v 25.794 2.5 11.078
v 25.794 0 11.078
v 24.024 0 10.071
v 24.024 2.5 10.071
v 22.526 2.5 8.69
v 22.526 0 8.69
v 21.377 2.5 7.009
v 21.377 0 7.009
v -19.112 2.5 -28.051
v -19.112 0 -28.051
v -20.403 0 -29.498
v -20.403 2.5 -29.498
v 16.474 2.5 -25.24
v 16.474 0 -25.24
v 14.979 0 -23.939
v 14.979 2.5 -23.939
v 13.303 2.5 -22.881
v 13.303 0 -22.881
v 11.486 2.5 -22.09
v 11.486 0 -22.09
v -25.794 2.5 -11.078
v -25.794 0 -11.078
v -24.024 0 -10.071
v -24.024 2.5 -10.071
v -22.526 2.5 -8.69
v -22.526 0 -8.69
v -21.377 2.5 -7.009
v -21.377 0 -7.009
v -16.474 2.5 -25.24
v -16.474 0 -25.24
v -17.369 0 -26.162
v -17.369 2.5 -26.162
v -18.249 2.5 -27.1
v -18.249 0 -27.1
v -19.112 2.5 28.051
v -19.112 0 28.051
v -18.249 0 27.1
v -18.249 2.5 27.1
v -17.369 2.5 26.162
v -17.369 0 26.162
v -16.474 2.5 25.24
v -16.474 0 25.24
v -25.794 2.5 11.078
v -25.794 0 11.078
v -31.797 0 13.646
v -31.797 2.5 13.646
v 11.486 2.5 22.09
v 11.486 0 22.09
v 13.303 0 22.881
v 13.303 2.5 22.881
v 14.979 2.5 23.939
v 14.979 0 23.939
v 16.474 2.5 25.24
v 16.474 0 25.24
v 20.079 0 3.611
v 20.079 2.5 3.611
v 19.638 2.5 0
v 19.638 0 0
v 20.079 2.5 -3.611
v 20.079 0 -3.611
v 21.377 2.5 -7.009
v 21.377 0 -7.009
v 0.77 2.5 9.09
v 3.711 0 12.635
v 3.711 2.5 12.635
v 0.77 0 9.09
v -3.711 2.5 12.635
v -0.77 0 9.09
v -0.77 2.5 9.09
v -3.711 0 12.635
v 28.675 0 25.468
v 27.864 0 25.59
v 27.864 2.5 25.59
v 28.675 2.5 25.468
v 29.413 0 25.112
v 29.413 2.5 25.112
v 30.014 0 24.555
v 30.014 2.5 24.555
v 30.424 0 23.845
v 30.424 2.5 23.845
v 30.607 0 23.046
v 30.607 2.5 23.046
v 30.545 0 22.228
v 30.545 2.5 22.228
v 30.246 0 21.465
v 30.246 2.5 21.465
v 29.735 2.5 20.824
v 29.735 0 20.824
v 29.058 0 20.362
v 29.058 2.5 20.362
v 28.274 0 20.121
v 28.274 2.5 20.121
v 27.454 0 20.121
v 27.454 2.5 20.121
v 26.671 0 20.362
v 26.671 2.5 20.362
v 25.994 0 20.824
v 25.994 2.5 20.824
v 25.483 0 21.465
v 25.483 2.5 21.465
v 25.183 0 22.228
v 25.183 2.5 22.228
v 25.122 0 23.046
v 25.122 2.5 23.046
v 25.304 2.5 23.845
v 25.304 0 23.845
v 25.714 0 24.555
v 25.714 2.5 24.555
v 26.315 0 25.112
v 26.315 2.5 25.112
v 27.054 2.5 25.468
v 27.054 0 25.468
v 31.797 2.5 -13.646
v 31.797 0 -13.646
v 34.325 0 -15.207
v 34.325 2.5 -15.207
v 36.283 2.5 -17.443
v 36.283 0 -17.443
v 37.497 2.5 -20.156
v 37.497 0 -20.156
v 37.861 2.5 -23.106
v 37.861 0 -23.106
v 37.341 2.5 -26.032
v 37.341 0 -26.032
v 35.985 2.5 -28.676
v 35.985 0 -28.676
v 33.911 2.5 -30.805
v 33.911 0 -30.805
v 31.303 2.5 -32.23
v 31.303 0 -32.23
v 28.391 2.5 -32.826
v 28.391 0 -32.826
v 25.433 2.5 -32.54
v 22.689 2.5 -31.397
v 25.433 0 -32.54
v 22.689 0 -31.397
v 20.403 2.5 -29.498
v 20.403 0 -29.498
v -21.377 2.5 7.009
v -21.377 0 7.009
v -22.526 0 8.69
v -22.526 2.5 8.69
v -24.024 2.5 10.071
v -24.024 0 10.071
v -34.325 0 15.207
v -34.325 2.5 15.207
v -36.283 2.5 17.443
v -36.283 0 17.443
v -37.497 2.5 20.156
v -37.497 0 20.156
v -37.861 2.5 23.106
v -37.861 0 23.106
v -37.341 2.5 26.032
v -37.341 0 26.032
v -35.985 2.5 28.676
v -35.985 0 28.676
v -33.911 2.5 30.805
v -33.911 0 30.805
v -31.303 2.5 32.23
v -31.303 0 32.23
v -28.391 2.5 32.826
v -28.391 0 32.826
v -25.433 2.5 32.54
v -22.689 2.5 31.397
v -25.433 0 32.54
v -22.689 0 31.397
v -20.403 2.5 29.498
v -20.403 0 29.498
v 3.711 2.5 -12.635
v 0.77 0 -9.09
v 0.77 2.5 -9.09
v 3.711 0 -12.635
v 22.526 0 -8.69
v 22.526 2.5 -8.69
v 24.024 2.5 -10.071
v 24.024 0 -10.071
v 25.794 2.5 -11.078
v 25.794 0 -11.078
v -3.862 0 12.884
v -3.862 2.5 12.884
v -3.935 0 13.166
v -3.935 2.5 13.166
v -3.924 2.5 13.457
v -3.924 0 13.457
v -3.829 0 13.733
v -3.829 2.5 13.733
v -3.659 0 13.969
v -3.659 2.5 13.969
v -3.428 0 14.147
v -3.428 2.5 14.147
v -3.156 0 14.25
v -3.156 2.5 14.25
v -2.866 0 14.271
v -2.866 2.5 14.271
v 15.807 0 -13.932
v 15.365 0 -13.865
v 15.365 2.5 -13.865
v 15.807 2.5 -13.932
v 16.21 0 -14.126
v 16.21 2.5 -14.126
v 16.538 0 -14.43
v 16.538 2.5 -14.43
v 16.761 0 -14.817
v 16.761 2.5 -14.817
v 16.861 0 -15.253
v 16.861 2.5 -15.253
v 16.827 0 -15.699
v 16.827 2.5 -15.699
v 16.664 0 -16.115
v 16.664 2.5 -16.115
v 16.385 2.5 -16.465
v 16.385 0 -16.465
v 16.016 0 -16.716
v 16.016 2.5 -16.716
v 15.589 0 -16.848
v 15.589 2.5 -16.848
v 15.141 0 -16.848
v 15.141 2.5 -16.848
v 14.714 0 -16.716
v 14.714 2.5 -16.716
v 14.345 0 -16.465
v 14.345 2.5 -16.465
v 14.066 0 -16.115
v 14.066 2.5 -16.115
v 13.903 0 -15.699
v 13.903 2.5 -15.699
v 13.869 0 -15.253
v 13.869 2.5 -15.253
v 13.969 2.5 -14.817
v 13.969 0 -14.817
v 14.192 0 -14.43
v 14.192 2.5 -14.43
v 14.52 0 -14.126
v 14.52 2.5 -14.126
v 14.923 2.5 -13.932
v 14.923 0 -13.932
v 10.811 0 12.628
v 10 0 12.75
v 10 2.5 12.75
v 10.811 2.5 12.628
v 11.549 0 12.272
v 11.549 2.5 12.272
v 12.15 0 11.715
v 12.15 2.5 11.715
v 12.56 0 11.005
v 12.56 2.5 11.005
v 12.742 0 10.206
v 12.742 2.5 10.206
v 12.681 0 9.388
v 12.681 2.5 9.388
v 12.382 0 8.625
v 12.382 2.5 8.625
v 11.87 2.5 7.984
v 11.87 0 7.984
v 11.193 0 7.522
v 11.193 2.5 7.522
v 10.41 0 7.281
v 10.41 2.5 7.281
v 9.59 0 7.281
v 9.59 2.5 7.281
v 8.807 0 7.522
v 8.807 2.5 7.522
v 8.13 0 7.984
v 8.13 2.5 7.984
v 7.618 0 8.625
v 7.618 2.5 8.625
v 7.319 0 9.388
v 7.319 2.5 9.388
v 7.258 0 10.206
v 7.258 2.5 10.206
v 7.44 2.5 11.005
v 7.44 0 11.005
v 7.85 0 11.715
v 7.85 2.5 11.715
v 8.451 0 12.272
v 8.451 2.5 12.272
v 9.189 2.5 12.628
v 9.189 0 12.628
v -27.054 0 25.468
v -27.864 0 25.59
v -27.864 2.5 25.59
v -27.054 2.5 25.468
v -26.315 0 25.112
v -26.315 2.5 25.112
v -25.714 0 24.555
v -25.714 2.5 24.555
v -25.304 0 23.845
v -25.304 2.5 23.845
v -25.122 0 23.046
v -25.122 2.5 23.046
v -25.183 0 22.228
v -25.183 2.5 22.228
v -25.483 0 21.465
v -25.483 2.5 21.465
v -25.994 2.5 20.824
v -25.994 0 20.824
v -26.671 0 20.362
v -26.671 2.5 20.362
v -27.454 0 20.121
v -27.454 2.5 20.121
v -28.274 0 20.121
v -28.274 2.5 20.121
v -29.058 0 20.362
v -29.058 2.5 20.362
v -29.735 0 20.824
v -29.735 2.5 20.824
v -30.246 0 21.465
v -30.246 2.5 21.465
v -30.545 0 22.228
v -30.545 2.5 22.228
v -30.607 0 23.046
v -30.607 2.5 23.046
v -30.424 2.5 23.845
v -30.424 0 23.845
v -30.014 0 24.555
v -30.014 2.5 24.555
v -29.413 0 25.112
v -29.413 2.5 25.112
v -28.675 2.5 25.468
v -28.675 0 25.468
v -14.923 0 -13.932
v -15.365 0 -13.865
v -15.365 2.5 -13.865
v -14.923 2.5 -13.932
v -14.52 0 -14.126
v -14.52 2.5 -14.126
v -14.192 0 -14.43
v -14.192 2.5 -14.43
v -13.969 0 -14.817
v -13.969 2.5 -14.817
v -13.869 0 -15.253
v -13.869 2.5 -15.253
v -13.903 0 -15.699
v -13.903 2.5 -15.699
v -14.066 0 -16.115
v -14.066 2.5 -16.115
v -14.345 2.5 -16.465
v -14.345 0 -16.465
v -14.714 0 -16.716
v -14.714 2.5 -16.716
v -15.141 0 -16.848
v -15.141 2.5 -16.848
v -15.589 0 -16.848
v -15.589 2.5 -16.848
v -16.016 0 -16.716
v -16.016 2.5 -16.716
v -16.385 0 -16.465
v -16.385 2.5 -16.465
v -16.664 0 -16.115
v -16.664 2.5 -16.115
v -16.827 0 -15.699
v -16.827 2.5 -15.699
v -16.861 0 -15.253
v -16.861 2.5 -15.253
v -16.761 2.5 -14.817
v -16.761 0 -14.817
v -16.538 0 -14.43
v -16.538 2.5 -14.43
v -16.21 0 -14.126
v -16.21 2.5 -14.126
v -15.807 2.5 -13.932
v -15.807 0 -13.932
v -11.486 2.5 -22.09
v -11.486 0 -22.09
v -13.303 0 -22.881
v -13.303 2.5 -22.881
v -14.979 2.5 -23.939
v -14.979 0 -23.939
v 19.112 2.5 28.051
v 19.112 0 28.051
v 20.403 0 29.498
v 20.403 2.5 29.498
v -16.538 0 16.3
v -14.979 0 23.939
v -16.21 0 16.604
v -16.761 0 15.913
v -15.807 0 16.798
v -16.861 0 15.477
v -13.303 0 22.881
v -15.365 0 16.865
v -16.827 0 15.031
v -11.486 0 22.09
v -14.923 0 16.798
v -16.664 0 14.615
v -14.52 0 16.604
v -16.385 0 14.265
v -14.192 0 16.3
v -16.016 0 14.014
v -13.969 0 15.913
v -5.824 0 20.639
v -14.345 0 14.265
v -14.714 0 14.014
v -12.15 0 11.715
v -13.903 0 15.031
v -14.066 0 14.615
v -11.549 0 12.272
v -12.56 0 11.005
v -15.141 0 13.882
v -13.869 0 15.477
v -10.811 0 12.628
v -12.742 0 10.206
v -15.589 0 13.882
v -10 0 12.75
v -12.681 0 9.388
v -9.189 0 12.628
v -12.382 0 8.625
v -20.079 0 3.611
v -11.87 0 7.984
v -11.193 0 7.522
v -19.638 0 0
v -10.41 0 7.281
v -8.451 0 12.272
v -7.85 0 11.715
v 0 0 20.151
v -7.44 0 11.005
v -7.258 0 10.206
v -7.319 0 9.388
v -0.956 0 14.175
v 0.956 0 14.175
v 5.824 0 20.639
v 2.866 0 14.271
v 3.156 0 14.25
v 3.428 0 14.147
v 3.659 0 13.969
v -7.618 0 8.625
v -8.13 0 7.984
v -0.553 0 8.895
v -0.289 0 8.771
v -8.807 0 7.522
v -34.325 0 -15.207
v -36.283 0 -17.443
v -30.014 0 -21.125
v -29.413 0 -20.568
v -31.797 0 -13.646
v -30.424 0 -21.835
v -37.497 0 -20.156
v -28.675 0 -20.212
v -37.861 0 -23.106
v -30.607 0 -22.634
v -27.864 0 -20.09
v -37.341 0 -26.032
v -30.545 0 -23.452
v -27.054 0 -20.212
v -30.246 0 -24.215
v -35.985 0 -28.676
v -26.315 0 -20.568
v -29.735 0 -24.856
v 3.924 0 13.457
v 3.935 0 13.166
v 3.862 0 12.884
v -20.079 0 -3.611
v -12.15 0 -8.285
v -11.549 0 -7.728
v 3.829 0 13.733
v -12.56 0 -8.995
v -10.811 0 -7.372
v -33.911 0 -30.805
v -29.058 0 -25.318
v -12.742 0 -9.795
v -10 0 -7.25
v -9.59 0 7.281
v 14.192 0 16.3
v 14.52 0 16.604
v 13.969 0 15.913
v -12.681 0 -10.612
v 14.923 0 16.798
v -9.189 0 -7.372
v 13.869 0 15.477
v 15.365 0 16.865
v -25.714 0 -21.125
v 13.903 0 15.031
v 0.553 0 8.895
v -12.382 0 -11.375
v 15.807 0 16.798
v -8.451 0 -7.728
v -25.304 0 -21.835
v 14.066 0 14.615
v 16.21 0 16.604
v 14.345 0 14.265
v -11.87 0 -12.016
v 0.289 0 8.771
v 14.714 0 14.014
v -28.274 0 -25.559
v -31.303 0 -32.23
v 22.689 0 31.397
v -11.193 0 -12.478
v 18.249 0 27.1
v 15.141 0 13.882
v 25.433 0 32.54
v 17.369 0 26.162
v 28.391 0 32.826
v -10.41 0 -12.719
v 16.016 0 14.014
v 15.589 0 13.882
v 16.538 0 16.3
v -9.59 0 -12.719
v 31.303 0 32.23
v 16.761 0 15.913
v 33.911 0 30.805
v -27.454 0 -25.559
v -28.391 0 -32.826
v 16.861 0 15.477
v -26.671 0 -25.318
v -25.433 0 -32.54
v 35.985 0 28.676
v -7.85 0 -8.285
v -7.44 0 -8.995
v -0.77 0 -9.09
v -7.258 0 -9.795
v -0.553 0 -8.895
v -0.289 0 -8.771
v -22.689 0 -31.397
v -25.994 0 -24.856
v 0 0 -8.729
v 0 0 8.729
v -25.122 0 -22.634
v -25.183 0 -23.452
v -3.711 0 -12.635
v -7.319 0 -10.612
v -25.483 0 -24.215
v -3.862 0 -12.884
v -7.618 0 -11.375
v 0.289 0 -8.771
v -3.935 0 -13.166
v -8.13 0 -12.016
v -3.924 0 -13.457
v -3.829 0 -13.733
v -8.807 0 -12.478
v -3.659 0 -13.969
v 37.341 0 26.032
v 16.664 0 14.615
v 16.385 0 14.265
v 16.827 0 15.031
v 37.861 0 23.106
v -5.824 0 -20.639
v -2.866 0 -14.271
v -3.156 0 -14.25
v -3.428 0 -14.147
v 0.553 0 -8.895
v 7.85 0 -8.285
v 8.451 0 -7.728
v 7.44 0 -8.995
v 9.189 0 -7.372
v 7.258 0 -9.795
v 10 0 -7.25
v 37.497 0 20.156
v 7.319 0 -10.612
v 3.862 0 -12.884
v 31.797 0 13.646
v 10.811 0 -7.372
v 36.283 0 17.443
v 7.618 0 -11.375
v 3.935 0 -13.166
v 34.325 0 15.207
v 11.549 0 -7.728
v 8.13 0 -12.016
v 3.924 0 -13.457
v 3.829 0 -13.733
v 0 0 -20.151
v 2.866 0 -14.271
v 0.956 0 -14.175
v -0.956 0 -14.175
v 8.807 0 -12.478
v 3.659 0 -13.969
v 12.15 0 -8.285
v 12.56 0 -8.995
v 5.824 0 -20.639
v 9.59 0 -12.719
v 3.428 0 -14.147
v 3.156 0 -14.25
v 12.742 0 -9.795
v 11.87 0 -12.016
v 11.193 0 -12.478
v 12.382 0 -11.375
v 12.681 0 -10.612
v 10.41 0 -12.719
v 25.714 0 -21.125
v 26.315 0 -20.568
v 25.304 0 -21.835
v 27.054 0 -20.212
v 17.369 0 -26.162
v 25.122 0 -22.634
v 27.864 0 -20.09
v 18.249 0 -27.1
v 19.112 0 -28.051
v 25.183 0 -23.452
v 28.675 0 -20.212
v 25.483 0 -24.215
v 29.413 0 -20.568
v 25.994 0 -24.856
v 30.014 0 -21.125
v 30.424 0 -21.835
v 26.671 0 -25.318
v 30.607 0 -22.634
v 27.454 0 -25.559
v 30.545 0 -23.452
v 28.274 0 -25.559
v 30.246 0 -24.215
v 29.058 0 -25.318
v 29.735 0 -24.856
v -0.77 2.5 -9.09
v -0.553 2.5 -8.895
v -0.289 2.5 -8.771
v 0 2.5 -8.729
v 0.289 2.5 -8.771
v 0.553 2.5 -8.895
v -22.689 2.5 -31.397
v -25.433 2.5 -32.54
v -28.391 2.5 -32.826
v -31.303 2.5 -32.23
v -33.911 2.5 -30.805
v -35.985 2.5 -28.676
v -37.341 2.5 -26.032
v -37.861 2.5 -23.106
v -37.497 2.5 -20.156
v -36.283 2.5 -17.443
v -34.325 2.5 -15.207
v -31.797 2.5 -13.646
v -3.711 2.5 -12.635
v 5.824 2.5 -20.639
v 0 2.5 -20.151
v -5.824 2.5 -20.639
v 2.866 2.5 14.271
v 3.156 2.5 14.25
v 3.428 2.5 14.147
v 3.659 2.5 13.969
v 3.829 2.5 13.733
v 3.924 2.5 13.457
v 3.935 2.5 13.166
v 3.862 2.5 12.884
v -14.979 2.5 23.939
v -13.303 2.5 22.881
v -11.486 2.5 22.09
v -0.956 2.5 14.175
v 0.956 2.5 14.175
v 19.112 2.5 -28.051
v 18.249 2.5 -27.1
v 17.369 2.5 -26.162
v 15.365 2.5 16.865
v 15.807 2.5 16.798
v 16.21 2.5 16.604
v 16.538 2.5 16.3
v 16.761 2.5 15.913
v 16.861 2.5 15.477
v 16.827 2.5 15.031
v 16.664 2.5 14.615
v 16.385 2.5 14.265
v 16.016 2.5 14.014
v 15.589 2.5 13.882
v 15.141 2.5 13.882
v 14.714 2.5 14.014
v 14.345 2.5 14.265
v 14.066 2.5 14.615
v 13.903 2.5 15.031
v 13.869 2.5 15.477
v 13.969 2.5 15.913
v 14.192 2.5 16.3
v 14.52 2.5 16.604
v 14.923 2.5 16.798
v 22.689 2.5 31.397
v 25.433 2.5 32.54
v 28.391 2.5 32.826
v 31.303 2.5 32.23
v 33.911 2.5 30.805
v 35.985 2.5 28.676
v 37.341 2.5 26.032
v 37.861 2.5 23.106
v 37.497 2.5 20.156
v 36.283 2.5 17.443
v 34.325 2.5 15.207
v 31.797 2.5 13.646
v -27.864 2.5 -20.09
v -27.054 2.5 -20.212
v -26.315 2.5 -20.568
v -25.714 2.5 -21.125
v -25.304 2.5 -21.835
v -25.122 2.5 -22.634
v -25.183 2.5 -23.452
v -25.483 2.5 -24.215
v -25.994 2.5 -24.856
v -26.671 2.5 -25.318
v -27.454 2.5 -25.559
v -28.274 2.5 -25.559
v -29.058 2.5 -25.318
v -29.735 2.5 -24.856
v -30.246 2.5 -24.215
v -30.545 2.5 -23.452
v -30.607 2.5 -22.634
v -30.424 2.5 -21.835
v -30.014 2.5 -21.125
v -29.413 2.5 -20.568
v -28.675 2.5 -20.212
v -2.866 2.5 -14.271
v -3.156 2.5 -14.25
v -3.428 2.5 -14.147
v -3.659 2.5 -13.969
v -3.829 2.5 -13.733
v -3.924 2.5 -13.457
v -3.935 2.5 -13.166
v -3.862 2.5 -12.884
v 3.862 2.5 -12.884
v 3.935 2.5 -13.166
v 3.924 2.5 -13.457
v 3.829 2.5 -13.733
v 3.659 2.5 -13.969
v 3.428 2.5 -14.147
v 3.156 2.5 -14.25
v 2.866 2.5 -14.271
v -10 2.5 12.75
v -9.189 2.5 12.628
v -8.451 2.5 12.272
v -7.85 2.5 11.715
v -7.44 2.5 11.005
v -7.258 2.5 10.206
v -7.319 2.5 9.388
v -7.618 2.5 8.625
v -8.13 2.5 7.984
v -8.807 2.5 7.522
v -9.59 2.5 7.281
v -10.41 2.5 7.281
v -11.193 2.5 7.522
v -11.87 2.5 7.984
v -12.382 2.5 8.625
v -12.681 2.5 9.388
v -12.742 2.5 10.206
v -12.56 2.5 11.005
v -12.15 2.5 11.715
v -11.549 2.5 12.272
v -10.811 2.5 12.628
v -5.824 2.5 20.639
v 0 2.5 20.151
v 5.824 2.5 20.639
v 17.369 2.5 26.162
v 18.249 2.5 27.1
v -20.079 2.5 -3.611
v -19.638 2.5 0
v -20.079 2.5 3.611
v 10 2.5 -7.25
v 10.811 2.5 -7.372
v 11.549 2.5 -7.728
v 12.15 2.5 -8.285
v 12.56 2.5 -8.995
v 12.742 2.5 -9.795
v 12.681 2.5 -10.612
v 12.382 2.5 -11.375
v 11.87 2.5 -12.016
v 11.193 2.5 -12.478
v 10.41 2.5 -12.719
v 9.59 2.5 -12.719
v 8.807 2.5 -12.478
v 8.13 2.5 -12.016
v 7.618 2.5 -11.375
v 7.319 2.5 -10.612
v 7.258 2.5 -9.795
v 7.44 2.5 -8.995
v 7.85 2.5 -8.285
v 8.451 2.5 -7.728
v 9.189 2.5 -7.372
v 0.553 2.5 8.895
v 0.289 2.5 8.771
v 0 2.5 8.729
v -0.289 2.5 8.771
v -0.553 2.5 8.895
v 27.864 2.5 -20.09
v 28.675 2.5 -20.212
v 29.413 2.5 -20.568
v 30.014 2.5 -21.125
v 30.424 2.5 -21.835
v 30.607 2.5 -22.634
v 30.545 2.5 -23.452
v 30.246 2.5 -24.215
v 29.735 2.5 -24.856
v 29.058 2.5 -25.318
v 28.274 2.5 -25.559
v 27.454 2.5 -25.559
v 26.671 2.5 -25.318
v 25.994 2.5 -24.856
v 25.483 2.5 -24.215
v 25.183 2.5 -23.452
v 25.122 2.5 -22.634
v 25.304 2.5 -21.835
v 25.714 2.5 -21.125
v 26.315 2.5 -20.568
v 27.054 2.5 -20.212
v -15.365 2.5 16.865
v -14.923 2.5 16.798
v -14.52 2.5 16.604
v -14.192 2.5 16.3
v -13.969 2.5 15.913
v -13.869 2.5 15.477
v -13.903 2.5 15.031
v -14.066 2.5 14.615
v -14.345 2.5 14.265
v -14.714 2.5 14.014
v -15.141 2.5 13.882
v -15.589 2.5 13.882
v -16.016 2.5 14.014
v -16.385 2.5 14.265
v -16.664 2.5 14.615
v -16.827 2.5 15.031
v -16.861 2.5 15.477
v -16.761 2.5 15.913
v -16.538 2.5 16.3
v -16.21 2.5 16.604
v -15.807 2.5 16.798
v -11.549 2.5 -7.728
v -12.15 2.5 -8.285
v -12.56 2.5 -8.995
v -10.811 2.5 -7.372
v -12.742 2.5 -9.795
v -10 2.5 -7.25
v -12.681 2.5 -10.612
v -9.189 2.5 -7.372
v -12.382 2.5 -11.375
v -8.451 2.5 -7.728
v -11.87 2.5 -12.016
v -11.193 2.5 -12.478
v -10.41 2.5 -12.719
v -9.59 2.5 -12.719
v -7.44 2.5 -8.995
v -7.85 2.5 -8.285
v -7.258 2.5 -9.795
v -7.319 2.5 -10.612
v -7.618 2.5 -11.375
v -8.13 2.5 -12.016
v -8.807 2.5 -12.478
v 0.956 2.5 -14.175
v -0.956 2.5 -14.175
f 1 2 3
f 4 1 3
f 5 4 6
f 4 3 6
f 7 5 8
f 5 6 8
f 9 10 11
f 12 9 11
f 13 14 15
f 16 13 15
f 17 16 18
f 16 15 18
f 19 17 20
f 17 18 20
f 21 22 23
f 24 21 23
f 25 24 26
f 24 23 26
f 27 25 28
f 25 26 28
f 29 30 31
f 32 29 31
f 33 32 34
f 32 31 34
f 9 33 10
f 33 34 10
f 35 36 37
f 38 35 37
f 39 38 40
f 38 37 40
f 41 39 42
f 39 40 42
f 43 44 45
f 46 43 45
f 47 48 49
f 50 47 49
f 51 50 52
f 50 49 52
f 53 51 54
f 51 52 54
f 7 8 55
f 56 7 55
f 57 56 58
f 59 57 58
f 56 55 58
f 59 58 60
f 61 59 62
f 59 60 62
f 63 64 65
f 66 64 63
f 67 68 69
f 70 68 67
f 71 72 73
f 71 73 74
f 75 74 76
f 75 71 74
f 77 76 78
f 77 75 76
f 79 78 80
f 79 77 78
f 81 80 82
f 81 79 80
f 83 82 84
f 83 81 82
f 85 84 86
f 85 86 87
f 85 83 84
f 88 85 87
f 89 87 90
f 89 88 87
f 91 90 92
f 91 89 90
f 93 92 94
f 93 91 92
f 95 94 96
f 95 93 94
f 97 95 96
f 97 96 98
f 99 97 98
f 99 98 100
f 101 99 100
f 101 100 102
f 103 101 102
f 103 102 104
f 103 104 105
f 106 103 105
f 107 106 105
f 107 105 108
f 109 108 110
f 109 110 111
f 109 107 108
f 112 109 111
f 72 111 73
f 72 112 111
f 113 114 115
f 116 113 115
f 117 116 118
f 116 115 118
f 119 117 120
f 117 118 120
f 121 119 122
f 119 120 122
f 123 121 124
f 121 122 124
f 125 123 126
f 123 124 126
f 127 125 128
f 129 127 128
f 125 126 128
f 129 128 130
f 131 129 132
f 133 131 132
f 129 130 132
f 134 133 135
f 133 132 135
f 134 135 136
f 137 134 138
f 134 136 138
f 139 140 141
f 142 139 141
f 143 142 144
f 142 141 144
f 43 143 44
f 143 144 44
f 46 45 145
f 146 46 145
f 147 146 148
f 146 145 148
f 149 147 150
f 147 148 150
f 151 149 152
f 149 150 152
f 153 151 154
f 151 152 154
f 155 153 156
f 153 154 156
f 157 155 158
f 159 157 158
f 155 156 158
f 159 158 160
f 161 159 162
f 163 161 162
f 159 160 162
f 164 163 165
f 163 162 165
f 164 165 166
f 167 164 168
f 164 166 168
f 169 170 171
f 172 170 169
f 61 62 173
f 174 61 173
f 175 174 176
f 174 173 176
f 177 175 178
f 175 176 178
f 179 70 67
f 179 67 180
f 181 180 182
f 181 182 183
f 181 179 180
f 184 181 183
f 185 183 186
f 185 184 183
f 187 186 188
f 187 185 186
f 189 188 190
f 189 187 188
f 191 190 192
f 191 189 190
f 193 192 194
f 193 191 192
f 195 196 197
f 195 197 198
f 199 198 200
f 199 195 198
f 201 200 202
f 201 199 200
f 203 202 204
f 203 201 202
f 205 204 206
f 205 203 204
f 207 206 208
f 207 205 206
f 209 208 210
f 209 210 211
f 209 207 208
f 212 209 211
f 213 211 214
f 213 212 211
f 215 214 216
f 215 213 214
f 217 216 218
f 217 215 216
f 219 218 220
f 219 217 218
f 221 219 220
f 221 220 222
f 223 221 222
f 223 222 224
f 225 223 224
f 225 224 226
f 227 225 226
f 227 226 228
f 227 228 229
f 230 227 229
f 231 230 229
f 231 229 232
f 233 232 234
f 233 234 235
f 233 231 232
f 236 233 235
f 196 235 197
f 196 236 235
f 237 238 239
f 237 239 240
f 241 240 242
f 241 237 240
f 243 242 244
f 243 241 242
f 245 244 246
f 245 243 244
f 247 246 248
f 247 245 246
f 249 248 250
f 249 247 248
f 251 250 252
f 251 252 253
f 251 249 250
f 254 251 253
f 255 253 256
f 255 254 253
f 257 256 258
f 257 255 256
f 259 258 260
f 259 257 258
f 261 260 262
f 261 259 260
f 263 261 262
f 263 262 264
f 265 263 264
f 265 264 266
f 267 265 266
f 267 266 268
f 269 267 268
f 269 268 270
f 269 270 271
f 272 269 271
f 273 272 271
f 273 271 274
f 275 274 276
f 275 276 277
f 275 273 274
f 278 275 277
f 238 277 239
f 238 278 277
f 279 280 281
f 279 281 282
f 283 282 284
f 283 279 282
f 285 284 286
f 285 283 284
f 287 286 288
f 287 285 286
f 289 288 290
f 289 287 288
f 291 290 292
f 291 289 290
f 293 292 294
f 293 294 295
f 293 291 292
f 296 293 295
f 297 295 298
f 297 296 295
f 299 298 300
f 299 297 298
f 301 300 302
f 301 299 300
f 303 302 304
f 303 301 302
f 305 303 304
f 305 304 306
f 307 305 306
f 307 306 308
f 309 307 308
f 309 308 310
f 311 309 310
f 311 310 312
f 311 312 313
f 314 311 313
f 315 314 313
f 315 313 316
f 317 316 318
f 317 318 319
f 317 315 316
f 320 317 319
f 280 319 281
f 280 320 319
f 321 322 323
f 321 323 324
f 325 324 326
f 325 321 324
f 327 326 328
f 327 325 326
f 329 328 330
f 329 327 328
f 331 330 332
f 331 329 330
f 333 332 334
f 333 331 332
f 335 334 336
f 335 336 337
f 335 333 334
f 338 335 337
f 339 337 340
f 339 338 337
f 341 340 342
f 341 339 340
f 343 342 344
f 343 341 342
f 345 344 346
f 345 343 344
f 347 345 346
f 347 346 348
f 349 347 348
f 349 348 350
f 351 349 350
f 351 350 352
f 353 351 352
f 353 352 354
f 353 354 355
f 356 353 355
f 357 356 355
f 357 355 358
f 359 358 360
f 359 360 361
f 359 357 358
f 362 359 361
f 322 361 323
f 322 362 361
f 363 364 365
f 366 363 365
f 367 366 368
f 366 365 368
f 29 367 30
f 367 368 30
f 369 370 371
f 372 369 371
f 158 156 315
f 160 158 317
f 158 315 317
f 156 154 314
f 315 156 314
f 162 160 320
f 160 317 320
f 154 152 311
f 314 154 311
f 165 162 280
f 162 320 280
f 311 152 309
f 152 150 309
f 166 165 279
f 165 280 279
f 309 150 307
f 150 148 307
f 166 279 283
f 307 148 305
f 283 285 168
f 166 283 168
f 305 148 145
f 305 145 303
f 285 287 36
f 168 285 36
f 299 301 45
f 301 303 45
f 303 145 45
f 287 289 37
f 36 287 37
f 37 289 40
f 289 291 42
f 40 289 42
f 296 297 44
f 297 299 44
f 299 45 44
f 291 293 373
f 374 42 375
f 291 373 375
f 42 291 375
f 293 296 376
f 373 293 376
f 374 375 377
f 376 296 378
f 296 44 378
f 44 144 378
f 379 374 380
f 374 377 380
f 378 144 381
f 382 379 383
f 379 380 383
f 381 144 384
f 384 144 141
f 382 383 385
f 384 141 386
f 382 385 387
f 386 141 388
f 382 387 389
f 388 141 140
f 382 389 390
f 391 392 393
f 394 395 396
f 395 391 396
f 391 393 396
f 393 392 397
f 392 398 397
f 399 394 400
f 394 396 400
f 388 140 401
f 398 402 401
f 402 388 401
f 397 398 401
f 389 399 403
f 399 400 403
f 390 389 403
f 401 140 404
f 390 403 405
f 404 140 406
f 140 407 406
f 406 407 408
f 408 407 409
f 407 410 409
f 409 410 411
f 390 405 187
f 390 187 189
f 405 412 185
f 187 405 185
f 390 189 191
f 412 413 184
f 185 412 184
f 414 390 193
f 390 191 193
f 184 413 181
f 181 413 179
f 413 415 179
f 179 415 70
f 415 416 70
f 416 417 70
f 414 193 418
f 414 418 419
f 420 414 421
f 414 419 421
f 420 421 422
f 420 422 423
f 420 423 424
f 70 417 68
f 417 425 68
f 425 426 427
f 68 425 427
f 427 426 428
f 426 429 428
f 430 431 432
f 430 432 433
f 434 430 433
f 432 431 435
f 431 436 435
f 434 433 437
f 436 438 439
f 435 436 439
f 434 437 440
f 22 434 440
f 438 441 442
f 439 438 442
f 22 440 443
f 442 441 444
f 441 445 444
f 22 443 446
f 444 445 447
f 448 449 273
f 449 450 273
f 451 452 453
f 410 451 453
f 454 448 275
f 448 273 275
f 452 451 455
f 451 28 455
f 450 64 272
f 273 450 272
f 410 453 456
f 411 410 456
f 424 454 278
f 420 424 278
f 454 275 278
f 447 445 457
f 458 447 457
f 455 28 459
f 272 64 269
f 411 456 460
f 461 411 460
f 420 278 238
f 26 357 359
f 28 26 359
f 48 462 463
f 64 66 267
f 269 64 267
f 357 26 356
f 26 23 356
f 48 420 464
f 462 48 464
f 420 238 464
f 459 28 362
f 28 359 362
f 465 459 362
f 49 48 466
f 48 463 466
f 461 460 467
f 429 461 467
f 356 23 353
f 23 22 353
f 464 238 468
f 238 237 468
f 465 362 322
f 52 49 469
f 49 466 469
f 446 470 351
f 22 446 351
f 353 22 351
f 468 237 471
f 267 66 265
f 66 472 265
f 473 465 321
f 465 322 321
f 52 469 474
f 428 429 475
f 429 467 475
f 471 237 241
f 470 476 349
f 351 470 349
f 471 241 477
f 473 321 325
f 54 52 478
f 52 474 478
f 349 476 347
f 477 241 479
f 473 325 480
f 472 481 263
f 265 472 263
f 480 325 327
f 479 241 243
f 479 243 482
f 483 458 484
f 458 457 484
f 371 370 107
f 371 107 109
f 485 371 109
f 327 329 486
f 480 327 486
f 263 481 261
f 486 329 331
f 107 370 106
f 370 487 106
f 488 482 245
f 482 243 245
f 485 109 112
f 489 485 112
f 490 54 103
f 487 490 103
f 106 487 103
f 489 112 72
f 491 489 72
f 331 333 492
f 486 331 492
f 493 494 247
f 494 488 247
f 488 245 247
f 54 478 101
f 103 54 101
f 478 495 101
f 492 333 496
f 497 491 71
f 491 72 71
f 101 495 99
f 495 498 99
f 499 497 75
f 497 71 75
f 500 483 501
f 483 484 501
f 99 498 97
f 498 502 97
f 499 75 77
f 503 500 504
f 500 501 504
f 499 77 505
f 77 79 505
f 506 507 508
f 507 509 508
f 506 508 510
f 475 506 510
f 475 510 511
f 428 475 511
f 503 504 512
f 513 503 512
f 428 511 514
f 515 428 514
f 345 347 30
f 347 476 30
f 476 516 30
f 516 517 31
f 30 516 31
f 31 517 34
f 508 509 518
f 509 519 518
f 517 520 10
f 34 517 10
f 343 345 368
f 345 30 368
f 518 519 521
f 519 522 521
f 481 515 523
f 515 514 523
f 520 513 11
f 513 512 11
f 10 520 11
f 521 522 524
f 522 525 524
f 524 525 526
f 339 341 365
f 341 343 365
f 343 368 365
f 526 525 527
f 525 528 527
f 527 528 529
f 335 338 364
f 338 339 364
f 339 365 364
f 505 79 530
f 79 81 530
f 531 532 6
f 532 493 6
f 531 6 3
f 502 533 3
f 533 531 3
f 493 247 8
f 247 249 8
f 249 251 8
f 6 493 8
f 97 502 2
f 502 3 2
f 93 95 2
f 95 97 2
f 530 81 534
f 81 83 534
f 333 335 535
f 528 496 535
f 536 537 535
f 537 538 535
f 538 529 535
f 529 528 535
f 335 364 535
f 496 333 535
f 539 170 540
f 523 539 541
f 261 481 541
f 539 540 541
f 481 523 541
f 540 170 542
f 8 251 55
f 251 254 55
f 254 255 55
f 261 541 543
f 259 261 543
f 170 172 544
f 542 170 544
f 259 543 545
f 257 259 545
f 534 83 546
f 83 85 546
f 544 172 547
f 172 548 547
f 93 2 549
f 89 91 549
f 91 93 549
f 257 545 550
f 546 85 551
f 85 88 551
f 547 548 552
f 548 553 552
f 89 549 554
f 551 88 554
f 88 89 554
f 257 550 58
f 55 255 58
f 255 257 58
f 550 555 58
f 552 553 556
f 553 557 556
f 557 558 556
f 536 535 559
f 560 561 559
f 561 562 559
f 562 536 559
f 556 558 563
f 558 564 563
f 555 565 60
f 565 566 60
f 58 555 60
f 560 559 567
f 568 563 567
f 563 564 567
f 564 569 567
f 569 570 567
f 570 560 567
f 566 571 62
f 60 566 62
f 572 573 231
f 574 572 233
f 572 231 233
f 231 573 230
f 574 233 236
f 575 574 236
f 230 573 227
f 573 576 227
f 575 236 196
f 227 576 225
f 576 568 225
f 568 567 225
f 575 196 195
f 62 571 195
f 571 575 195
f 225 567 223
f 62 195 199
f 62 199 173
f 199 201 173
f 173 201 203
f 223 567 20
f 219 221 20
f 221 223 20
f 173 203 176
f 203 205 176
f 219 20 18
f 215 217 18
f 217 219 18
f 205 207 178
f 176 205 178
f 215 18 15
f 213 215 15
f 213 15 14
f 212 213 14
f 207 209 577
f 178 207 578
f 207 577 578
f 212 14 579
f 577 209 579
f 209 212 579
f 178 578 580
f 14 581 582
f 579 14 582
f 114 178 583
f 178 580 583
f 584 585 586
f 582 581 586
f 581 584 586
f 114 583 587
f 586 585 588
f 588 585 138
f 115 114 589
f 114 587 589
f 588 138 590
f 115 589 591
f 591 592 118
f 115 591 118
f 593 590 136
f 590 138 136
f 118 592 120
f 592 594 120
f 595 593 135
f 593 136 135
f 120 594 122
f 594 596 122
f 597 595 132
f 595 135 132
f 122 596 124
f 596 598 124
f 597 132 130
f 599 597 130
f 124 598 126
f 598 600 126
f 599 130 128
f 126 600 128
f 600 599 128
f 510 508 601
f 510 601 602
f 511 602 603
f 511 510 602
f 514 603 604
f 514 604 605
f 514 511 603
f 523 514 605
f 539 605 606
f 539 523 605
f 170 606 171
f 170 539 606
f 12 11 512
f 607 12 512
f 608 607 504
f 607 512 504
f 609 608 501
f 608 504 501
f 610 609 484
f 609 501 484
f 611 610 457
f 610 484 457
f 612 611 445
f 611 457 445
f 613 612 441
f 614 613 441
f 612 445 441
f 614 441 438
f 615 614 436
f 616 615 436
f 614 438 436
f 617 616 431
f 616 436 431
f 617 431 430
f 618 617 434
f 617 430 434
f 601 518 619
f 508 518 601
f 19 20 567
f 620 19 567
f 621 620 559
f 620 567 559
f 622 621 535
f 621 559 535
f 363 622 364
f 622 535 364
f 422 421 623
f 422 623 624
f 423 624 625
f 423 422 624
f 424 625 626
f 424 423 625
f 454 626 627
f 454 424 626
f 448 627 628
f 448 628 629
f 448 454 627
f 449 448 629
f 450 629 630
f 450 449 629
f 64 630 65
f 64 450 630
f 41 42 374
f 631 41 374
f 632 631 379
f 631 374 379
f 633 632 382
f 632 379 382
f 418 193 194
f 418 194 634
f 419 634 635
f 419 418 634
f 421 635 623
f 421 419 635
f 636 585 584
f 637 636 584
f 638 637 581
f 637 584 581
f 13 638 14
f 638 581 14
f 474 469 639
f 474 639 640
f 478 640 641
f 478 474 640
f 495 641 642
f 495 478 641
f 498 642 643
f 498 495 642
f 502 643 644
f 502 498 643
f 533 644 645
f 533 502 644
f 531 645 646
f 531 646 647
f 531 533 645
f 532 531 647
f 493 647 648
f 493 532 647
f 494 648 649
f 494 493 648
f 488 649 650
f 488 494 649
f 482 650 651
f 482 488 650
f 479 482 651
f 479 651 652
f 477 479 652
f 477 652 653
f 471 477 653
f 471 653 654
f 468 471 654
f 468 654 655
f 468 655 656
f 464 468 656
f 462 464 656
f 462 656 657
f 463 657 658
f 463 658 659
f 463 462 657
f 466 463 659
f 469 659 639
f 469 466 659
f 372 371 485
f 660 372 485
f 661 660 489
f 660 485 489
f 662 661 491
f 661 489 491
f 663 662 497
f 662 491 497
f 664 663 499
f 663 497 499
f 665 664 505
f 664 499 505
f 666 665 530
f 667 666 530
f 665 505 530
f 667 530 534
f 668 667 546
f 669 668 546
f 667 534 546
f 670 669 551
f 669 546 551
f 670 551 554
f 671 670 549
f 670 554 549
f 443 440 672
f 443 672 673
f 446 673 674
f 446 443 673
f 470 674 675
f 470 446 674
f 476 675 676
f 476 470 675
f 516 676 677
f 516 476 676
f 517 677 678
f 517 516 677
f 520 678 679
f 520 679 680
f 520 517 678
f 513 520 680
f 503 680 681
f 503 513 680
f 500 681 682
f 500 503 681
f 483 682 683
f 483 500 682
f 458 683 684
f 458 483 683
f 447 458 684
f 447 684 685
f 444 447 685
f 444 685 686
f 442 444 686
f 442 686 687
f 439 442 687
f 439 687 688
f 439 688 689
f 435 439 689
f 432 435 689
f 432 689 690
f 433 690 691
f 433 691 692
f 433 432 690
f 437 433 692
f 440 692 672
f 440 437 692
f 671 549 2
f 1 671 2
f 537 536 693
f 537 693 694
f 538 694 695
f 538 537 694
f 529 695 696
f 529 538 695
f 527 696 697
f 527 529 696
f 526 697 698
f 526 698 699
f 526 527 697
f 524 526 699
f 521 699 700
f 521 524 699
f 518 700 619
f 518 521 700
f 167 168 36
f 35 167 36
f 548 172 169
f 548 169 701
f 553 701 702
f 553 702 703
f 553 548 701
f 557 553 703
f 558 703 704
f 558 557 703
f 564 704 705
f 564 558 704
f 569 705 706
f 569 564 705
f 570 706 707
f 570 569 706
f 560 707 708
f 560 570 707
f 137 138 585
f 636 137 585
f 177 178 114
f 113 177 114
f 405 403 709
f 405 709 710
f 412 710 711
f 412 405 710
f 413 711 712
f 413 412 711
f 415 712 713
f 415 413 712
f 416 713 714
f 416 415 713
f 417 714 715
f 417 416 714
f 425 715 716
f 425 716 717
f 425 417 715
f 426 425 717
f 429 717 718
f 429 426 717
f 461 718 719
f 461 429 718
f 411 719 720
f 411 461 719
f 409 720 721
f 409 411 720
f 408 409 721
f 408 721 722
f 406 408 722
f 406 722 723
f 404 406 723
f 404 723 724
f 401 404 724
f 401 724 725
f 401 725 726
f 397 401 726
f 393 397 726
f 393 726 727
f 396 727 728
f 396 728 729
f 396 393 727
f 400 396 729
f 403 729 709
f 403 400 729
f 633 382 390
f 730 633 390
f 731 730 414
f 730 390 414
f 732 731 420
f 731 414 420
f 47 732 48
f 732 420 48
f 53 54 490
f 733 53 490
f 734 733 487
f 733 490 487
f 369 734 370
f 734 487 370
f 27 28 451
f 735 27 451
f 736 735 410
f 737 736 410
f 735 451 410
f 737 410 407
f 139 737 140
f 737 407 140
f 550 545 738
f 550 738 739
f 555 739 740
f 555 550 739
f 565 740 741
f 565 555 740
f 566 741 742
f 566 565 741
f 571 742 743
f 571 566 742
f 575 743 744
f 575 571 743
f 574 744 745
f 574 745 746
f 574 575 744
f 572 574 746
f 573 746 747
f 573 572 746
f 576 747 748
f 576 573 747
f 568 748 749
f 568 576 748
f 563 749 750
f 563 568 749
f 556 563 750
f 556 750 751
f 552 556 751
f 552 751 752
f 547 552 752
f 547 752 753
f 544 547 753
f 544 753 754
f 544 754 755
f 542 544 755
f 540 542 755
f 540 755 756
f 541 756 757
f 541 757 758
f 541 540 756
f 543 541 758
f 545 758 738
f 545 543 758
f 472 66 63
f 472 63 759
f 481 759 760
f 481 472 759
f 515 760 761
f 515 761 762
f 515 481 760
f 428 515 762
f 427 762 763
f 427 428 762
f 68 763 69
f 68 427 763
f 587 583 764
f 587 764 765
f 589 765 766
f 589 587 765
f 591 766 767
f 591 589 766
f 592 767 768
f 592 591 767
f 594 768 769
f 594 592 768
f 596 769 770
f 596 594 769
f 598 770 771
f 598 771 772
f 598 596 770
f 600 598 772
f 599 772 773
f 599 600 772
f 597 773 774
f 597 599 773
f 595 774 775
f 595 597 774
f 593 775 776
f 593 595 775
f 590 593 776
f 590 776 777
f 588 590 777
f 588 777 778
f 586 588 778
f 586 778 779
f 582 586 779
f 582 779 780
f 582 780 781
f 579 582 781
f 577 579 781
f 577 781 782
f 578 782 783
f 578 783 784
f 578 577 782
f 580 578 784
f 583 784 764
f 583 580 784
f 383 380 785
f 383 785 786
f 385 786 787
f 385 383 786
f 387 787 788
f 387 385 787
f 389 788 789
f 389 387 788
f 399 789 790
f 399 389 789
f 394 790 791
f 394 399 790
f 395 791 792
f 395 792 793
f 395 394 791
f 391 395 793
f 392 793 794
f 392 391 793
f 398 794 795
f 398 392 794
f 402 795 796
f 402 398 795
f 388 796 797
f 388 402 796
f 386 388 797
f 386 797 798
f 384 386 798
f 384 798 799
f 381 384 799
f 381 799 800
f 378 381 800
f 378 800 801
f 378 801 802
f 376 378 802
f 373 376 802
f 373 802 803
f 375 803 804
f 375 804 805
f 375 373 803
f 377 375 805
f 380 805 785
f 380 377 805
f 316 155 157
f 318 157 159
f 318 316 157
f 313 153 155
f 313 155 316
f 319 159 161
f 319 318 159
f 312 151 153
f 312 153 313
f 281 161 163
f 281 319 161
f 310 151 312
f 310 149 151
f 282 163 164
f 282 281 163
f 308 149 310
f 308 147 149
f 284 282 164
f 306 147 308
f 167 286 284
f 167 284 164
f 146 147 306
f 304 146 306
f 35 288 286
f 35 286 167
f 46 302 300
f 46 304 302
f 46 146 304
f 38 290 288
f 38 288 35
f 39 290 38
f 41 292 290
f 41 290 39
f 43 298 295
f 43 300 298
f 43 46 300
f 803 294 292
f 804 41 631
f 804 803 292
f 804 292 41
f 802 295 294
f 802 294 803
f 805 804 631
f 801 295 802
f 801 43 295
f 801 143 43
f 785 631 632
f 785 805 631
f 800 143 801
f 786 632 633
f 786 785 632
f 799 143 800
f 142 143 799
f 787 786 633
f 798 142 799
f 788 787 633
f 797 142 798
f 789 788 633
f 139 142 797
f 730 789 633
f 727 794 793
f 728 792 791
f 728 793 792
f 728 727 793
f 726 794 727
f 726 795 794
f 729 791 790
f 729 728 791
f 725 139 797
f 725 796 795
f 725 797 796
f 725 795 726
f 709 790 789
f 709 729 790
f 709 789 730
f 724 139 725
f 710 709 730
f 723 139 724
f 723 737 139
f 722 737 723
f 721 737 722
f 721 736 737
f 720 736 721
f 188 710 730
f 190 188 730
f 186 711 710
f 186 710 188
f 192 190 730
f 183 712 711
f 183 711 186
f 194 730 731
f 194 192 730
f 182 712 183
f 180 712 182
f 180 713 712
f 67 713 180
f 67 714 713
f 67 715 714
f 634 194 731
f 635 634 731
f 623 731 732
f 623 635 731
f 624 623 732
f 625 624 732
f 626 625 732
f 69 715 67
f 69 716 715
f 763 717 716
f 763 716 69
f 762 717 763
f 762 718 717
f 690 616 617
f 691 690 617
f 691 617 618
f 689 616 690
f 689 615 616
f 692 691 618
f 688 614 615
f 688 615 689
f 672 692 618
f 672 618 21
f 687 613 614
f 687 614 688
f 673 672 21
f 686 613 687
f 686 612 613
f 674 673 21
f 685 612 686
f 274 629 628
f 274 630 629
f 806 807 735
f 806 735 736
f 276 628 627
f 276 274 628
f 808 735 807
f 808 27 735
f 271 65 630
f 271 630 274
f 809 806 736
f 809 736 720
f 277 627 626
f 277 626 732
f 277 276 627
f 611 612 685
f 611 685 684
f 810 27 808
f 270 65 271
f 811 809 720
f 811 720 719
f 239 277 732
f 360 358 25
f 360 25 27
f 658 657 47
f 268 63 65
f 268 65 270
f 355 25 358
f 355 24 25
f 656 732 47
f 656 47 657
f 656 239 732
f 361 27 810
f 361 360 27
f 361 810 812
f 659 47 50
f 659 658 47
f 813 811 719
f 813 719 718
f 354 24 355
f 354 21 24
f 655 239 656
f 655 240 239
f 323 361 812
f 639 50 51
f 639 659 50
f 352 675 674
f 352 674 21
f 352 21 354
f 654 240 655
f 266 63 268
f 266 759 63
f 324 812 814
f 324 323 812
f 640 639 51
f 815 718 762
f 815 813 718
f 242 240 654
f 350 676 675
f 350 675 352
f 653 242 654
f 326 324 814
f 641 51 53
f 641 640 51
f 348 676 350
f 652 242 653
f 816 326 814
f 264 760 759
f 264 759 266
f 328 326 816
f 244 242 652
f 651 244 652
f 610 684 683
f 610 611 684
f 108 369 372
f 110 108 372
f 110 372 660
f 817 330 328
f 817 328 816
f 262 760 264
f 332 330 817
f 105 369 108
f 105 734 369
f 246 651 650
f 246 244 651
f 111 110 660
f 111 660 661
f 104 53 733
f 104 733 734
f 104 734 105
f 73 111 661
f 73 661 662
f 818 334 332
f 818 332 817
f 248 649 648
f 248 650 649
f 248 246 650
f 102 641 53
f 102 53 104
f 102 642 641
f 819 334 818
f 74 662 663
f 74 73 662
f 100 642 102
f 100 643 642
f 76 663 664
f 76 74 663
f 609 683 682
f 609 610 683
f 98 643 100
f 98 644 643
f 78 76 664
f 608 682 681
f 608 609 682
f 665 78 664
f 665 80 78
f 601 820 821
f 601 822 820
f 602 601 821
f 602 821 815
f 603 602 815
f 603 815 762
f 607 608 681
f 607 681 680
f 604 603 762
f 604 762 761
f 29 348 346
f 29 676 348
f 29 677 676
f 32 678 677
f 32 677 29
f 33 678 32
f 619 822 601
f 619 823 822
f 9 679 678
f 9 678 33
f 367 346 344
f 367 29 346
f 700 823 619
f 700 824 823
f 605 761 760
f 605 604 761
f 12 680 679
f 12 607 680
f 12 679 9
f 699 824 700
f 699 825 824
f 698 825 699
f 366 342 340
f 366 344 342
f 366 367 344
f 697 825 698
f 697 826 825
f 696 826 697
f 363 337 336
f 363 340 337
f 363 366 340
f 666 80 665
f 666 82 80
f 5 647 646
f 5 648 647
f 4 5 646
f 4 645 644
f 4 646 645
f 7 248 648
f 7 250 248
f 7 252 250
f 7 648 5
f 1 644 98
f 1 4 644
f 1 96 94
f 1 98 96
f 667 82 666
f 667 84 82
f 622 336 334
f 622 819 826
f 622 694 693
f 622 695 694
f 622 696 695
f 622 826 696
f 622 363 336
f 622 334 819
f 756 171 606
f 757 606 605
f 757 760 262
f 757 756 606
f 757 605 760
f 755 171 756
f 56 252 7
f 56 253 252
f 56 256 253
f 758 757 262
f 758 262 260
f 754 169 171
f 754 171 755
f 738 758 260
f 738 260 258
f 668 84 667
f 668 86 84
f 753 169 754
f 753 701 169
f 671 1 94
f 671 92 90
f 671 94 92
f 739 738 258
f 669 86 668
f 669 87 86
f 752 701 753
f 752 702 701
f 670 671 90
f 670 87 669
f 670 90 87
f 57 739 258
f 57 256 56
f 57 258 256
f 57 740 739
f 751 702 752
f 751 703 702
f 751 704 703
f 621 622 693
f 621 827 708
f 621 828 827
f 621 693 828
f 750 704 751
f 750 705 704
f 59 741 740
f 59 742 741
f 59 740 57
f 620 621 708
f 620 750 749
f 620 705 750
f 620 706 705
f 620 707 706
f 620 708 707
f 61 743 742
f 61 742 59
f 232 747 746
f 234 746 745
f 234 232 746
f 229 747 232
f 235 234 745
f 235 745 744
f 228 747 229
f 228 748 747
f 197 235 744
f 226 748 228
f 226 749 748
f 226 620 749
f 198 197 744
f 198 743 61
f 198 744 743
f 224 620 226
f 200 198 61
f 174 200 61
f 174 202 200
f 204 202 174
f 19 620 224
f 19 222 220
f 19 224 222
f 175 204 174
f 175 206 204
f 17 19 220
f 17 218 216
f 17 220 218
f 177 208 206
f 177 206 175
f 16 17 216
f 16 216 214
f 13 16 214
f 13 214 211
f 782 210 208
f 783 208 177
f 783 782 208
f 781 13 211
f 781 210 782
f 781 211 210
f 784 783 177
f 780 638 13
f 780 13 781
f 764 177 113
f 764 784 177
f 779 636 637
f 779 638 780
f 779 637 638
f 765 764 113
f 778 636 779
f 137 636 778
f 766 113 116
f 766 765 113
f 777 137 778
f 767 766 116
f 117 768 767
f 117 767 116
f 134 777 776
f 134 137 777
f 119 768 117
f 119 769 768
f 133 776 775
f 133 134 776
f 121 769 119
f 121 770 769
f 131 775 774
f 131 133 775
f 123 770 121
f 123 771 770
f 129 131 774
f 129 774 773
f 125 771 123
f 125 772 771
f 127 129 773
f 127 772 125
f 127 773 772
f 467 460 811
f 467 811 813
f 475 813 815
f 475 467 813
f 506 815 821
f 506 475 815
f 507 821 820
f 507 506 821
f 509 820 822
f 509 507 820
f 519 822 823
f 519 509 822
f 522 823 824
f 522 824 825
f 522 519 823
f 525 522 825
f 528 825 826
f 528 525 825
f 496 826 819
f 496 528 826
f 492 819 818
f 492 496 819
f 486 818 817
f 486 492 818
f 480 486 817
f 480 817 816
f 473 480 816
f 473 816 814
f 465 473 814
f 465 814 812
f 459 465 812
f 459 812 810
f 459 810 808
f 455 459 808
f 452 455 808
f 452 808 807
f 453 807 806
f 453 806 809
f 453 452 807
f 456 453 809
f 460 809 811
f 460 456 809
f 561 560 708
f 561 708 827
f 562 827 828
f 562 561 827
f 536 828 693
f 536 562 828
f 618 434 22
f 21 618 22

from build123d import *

# Parameters (mm, degrees)
SKETCH2_R           = 1.5
SKETCH2_R_2         = 2.75
BOSS_EXTRUDE1_DEPTH = 2.5


with BuildPart() as part:
    # Sketch2 → Boss-Extrude1 (new body)
    with BuildSketch(Plane(origin=(0, 0, 0), x_dir=(1, 0, 0), z_dir=(0, 1, 0))):
        with BuildLine():
            Line((-20.402989885, -29.497935256), (-19.112268572, -28.051458372))
            ThreePointArc((-19.112268572, -28.051458372), (-17.810696545, -26.629075982), (-16.473919979, -25.239727278))
            ThreePointArc((-16.473919979, -25.239727278), (-14.160863056, -23.377992793), (-11.485697638, -22.089669229))
            ThreePointArc((-11.485697638, -22.089669229), (0, -20.15141071), (11.485697638, -22.089669229))
            ThreePointArc((11.485697638, -22.089669229), (14.160863056, -23.377992793), (16.473919979, -25.239727278))
            ThreePointArc((16.473919979, -25.239727278), (17.810696545, -26.629075982), (19.112268572, -28.051458372))
            Line((19.112268572, -28.051458372), (20.402989885, -29.497935256))
            ThreePointArc((20.402989885, -29.497935256), (35.984508278, -28.676365345), (31.796806607, -13.645668513))
            Line((31.796806607, -13.645668513), (25.794436634, -11.078432427))
            ThreePointArc((25.794436634, -11.078432427), (23.235962273, -9.423067761), (21.376539879, -7.008824278))
            ThreePointArc((21.376539879, -7.008824278), (19.638379202, 0), (21.376539879, 7.008824278))
            ThreePointArc((21.376539879, 7.008824278), (23.235962273, 9.423067761), (25.794436634, 11.078432427))
            Line((25.794436634, 11.078432427), (31.796806607, 13.645668513))
            ThreePointArc((31.796806607, 13.645668513), (35.984508278, 28.676365345), (20.402989885, 29.497935256))
            Line((20.402989885, 29.497935256), (19.112268572, 28.051458372))
            ThreePointArc((19.112268572, 28.051458372), (17.810696545, 26.629075982), (16.473919979, 25.239727278))
            ThreePointArc((16.473919979, 25.239727278), (14.160863056, 23.377992793), (11.485697638, 22.089669229))
            ThreePointArc((11.485697638, 22.089669229), (0, 20.15141071), (-11.485697638, 22.089669229))
            ThreePointArc((-11.485697638, 22.089669229), (-14.160863056, 23.377992793), (-16.473919979, 25.239727278))
            ThreePointArc((-16.473919979, 25.239727278), (-17.810696545, 26.629075982), (-19.112268572, 28.051458372))
            Line((-19.112268572, 28.051458372), (-20.402989885, 29.497935256))
            ThreePointArc((-20.402989885, 29.497935256), (-35.984508278, 28.676365345), (-31.796806607, 13.645668513))
            Line((-31.796806607, 13.645668513), (-25.794436634, 11.078432427))
            ThreePointArc((-25.794436634, 11.078432427), (-23.235962273, 9.423067761), (-21.376539879, 7.008824278))
            ThreePointArc((-21.376539879, 7.008824278), (-19.638379202, 0), (-21.376539879, -7.008824278))
            ThreePointArc((-21.376539879, -7.008824278), (-23.235962273, -9.423067761), (-25.794436634, -11.078432427))
            Line((-25.794436634, -11.078432427), (-31.796806607, -13.645668513))
            ThreePointArc((-31.796806607, -13.645668513), (-35.984508278, -28.676365345), (-20.402989885, -29.497935256))
        make_face()
        with Locations(Location((15.365, -15.365, 0), (0, 0, 270))):
            Circle(SKETCH2_R, mode=Mode.SUBTRACT)
        with Locations(Location((27.864354565, 22.840004863, 0), (0, 0, 270))):
            Circle(SKETCH2_R_2, mode=Mode.SUBTRACT)
        with Locations(Location((-15.365, 15.365, 0), (0, 0, 270))):
            Circle(SKETCH2_R, mode=Mode.SUBTRACT)
        with Locations(Location((15.365, 15.365, 0), (0, 0, 270))):
            Circle(SKETCH2_R, mode=Mode.SUBTRACT)
        with Locations(Location((-15.365, -15.365, 0), (0, 0, 270))):
            Circle(SKETCH2_R, mode=Mode.SUBTRACT)
        with Locations(Location((27.864354565, -22.840004863, 0), (0, 0, 270))):
            Circle(SKETCH2_R_2, mode=Mode.SUBTRACT)
        with Locations(Location((10.000016395, -10.000011804, 0), (0, 0, 270))):
            Circle(SKETCH2_R_2, mode=Mode.SUBTRACT)
        with Locations(Location((-27.864354565, 22.840004863, 0), (0, 0, 270))):
            Circle(SKETCH2_R_2, mode=Mode.SUBTRACT)
        with Locations(Location((-27.864354565, -22.840004863, 0), (0, 0, 270))):
            Circle(SKETCH2_R_2, mode=Mode.SUBTRACT)
        with Locations(Location((-10.000016395, -10.000011804, 0), (0, 0, 270))):
            Circle(SKETCH2_R_2, mode=Mode.SUBTRACT)
        with Locations(Location((-10.000016395, 10.000011804, 0), (0, 0, 270))):
            Circle(SKETCH2_R_2, mode=Mode.SUBTRACT)
        with Locations(Location((10.000016395, 10.000011804, 0), (0, 0, 270))):
            Circle(SKETCH2_R_2, mode=Mode.SUBTRACT)
        with BuildLine():
            Line((3.71054333, -12.635244665), (0.769622246, -9.090373716))
            ThreePointArc((0.769622246, -9.090373716), (0, -8.728873205), (-0.769622246, -9.090373716))
            Line((-0.769622246, -9.090373716), (-3.71054333, -12.635244665))
            ThreePointArc((-3.71054333, -12.635244665), (-3.829359507, -13.73273998), (-2.865512851, -14.2708969))
            ThreePointArc((-2.865512851, -14.2708969), (0, -14.16270124), (2.865512851, -14.2708969))
            ThreePointArc((2.865512851, -14.2708969), (3.829359508, -13.73273998), (3.71054333, -12.635244665))
        make_face(mode=Mode.SUBTRACT)
        with BuildLine():
            Line((-3.71054333, 12.635244665), (-0.769622246, 9.090373716))
            ThreePointArc((-0.769622246, 9.090373716), (0, 8.728873205), (0.769622246, 9.090373716))
            Line((0.769622246, 9.090373716), (3.71054333, 12.635244665))
            ThreePointArc((3.71054333, 12.635244665), (3.829359507, 13.73273998), (2.865512851, 14.2708969))
            ThreePointArc((2.865512851, 14.2708969), (0, 14.16270124), (-2.865512851, 14.2708969))
            ThreePointArc((-2.865512851, 14.2708969), (-3.829359508, 13.73273998), (-3.71054333, 12.635244665))
        make_face(mode=Mode.SUBTRACT)
    extrude(amount=BOSS_EXTRUDE1_DEPTH)


solid = part.part
